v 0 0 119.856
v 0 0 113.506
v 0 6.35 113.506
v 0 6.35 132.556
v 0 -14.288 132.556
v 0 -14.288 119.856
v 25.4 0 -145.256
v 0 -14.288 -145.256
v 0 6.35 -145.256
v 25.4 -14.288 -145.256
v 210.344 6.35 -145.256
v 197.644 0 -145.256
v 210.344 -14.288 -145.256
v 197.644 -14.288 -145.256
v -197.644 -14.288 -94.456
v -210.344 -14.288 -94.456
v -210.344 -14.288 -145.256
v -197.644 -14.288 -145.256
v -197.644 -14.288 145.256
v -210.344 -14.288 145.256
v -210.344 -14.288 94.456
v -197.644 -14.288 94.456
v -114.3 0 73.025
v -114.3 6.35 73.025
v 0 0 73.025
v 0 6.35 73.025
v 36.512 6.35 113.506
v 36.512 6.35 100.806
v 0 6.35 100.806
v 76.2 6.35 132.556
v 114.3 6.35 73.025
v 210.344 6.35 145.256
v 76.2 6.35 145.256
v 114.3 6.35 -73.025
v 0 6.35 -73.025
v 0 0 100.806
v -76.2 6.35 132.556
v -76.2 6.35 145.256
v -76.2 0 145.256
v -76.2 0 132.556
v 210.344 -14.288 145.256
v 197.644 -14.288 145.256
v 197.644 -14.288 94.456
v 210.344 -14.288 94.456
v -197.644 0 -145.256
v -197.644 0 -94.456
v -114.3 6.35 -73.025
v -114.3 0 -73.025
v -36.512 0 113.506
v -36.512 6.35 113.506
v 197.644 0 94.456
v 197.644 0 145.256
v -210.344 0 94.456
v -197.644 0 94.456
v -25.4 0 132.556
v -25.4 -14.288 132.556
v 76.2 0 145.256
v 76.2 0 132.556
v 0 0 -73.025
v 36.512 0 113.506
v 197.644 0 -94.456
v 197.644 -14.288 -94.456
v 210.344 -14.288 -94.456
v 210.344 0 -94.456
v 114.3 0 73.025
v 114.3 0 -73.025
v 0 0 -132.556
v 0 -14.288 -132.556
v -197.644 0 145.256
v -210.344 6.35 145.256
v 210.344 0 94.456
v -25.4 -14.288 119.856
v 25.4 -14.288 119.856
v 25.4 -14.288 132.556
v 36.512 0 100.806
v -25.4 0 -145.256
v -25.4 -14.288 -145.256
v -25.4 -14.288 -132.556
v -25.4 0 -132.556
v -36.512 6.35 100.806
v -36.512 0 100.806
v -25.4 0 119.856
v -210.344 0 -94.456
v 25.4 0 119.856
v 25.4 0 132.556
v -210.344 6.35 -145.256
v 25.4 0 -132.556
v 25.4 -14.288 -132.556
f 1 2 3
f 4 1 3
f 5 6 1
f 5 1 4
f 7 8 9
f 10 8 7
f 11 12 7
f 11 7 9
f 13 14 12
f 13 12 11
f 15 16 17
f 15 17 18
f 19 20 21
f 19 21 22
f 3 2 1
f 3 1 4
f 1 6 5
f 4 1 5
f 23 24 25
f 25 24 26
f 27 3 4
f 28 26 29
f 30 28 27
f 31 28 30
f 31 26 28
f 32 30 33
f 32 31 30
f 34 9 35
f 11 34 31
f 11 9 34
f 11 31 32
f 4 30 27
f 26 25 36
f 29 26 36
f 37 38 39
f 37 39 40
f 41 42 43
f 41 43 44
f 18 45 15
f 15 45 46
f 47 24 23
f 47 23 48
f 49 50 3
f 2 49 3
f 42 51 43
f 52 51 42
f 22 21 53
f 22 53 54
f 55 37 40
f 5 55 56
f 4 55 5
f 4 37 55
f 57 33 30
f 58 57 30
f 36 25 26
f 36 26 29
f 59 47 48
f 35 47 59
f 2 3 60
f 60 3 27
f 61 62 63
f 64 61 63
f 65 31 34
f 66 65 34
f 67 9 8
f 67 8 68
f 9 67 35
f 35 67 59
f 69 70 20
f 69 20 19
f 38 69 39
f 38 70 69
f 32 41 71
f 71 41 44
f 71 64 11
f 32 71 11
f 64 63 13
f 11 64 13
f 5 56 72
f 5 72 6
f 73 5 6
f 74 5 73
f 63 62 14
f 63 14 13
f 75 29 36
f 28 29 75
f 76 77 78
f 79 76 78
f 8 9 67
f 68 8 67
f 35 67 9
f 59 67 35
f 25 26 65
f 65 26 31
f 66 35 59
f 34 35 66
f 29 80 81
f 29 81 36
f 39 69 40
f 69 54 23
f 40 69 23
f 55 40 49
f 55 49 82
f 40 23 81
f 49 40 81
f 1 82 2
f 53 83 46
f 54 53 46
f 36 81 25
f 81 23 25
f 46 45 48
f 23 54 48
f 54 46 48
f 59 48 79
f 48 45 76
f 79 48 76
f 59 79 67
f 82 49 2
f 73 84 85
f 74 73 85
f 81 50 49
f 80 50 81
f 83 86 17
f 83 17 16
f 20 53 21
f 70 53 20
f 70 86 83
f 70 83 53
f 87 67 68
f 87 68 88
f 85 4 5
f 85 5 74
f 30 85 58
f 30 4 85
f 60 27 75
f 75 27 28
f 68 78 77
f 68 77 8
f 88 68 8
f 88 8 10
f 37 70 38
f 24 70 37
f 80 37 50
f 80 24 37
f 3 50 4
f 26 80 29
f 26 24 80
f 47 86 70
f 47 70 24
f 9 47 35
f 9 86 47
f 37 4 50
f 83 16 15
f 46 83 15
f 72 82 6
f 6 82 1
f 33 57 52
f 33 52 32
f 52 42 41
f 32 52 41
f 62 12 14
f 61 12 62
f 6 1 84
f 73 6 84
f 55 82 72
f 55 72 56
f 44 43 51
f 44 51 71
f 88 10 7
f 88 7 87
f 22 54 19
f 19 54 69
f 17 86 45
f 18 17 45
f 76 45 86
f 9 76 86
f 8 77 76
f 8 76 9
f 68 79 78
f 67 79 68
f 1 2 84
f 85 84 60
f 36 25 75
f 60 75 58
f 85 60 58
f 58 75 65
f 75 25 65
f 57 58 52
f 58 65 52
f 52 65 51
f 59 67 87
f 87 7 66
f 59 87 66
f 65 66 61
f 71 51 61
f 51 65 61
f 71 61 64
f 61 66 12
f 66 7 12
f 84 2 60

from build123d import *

# Parameters (mm, degrees)
SKETCH1_W           = 420.6875
SKETCH1_H           = 290.5125
BOSS_EXTRUDE1_DEPTH = 6.35
SKETCH2_W           = 228.6
SKETCH2_H           = 146.05
SKETCH2_W_2         = 73.025
SKETCH2_H_2         = 12.7
SKETCH2_W_3         = 152.4
CUT_EXTRUDE1_DEPTH  = 7.35
SKETCH4_W           = 12.7
SKETCH4_H           = 50.8
SKETCH4_W_2         = 50.8
SKETCH4_H_2         = 12.7
BOSS_EXTRUDE2_DEPTH = 14.2875


with BuildPart() as part:
    # Sketch1 → Boss-Extrude1 (new body)
    with BuildSketch(Plane(origin=(0, 0, 0), x_dir=(1, 0, 0), z_dir=(0, 1, 0))):
        Rectangle(SKETCH1_W, SKETCH1_H)
    extrude(amount=BOSS_EXTRUDE1_DEPTH)

    # Sketch2 → Cut-Extrude1 (cut, through all)
    with BuildSketch(Plane(origin=(0, 6.35, 0), x_dir=(1, 0, 0), z_dir=(0, 1, 0))):
        Rectangle(SKETCH2_W, SKETCH2_H)
        with Locations((0, -107.15625)):
            Rectangle(SKETCH2_W_2, SKETCH2_H_2)
        with Locations((0, -138.90625)):
            Rectangle(SKETCH2_W_3, SKETCH2_H_2)
    extrude(amount=-CUT_EXTRUDE1_DEPTH, mode=Mode.SUBTRACT)

    # Sketch4 → Boss-Extrude2 (add)
    with BuildSketch(Plane.XZ):
        with Locations((-203.99375, 119.85625)):
            Rectangle(SKETCH4_W, SKETCH4_H)
        with Locations((203.99375, 119.85625)):
            Rectangle(SKETCH4_W, SKETCH4_H)
        with Locations((-203.99375, -119.85625)):
            Rectangle(SKETCH4_W, SKETCH4_H)
        with Locations((203.99375, -119.85625)):
            Rectangle(SKETCH4_W, SKETCH4_H)
        with Locations((0, 126.20625)):
            Rectangle(SKETCH4_W_2, SKETCH4_H_2)
        with Locations((0, -138.90625)):
            Rectangle(SKETCH4_W_2, SKETCH4_H_2)
    extrude(amount=BOSS_EXTRUDE2_DEPTH)


with BuildPart() as body_2:
    # Split1: the piece on the far side of the plane
    add(part.part)
    split(bisect_by=Plane(origin=(0, 0, 0), x_dir=(0, 0, 1), z_dir=(1, 0, 0)), keep=Keep.BOTTOM)


with BuildPart() as part_1:
    add(part.part)

    # Split1
    split(bisect_by=Plane(origin=(0, 0, 0), x_dir=(0, 0, 1), z_dir=(1, 0, 0)), keep=Keep.TOP)


solid = Compound([body_2.part, part_1.part])
